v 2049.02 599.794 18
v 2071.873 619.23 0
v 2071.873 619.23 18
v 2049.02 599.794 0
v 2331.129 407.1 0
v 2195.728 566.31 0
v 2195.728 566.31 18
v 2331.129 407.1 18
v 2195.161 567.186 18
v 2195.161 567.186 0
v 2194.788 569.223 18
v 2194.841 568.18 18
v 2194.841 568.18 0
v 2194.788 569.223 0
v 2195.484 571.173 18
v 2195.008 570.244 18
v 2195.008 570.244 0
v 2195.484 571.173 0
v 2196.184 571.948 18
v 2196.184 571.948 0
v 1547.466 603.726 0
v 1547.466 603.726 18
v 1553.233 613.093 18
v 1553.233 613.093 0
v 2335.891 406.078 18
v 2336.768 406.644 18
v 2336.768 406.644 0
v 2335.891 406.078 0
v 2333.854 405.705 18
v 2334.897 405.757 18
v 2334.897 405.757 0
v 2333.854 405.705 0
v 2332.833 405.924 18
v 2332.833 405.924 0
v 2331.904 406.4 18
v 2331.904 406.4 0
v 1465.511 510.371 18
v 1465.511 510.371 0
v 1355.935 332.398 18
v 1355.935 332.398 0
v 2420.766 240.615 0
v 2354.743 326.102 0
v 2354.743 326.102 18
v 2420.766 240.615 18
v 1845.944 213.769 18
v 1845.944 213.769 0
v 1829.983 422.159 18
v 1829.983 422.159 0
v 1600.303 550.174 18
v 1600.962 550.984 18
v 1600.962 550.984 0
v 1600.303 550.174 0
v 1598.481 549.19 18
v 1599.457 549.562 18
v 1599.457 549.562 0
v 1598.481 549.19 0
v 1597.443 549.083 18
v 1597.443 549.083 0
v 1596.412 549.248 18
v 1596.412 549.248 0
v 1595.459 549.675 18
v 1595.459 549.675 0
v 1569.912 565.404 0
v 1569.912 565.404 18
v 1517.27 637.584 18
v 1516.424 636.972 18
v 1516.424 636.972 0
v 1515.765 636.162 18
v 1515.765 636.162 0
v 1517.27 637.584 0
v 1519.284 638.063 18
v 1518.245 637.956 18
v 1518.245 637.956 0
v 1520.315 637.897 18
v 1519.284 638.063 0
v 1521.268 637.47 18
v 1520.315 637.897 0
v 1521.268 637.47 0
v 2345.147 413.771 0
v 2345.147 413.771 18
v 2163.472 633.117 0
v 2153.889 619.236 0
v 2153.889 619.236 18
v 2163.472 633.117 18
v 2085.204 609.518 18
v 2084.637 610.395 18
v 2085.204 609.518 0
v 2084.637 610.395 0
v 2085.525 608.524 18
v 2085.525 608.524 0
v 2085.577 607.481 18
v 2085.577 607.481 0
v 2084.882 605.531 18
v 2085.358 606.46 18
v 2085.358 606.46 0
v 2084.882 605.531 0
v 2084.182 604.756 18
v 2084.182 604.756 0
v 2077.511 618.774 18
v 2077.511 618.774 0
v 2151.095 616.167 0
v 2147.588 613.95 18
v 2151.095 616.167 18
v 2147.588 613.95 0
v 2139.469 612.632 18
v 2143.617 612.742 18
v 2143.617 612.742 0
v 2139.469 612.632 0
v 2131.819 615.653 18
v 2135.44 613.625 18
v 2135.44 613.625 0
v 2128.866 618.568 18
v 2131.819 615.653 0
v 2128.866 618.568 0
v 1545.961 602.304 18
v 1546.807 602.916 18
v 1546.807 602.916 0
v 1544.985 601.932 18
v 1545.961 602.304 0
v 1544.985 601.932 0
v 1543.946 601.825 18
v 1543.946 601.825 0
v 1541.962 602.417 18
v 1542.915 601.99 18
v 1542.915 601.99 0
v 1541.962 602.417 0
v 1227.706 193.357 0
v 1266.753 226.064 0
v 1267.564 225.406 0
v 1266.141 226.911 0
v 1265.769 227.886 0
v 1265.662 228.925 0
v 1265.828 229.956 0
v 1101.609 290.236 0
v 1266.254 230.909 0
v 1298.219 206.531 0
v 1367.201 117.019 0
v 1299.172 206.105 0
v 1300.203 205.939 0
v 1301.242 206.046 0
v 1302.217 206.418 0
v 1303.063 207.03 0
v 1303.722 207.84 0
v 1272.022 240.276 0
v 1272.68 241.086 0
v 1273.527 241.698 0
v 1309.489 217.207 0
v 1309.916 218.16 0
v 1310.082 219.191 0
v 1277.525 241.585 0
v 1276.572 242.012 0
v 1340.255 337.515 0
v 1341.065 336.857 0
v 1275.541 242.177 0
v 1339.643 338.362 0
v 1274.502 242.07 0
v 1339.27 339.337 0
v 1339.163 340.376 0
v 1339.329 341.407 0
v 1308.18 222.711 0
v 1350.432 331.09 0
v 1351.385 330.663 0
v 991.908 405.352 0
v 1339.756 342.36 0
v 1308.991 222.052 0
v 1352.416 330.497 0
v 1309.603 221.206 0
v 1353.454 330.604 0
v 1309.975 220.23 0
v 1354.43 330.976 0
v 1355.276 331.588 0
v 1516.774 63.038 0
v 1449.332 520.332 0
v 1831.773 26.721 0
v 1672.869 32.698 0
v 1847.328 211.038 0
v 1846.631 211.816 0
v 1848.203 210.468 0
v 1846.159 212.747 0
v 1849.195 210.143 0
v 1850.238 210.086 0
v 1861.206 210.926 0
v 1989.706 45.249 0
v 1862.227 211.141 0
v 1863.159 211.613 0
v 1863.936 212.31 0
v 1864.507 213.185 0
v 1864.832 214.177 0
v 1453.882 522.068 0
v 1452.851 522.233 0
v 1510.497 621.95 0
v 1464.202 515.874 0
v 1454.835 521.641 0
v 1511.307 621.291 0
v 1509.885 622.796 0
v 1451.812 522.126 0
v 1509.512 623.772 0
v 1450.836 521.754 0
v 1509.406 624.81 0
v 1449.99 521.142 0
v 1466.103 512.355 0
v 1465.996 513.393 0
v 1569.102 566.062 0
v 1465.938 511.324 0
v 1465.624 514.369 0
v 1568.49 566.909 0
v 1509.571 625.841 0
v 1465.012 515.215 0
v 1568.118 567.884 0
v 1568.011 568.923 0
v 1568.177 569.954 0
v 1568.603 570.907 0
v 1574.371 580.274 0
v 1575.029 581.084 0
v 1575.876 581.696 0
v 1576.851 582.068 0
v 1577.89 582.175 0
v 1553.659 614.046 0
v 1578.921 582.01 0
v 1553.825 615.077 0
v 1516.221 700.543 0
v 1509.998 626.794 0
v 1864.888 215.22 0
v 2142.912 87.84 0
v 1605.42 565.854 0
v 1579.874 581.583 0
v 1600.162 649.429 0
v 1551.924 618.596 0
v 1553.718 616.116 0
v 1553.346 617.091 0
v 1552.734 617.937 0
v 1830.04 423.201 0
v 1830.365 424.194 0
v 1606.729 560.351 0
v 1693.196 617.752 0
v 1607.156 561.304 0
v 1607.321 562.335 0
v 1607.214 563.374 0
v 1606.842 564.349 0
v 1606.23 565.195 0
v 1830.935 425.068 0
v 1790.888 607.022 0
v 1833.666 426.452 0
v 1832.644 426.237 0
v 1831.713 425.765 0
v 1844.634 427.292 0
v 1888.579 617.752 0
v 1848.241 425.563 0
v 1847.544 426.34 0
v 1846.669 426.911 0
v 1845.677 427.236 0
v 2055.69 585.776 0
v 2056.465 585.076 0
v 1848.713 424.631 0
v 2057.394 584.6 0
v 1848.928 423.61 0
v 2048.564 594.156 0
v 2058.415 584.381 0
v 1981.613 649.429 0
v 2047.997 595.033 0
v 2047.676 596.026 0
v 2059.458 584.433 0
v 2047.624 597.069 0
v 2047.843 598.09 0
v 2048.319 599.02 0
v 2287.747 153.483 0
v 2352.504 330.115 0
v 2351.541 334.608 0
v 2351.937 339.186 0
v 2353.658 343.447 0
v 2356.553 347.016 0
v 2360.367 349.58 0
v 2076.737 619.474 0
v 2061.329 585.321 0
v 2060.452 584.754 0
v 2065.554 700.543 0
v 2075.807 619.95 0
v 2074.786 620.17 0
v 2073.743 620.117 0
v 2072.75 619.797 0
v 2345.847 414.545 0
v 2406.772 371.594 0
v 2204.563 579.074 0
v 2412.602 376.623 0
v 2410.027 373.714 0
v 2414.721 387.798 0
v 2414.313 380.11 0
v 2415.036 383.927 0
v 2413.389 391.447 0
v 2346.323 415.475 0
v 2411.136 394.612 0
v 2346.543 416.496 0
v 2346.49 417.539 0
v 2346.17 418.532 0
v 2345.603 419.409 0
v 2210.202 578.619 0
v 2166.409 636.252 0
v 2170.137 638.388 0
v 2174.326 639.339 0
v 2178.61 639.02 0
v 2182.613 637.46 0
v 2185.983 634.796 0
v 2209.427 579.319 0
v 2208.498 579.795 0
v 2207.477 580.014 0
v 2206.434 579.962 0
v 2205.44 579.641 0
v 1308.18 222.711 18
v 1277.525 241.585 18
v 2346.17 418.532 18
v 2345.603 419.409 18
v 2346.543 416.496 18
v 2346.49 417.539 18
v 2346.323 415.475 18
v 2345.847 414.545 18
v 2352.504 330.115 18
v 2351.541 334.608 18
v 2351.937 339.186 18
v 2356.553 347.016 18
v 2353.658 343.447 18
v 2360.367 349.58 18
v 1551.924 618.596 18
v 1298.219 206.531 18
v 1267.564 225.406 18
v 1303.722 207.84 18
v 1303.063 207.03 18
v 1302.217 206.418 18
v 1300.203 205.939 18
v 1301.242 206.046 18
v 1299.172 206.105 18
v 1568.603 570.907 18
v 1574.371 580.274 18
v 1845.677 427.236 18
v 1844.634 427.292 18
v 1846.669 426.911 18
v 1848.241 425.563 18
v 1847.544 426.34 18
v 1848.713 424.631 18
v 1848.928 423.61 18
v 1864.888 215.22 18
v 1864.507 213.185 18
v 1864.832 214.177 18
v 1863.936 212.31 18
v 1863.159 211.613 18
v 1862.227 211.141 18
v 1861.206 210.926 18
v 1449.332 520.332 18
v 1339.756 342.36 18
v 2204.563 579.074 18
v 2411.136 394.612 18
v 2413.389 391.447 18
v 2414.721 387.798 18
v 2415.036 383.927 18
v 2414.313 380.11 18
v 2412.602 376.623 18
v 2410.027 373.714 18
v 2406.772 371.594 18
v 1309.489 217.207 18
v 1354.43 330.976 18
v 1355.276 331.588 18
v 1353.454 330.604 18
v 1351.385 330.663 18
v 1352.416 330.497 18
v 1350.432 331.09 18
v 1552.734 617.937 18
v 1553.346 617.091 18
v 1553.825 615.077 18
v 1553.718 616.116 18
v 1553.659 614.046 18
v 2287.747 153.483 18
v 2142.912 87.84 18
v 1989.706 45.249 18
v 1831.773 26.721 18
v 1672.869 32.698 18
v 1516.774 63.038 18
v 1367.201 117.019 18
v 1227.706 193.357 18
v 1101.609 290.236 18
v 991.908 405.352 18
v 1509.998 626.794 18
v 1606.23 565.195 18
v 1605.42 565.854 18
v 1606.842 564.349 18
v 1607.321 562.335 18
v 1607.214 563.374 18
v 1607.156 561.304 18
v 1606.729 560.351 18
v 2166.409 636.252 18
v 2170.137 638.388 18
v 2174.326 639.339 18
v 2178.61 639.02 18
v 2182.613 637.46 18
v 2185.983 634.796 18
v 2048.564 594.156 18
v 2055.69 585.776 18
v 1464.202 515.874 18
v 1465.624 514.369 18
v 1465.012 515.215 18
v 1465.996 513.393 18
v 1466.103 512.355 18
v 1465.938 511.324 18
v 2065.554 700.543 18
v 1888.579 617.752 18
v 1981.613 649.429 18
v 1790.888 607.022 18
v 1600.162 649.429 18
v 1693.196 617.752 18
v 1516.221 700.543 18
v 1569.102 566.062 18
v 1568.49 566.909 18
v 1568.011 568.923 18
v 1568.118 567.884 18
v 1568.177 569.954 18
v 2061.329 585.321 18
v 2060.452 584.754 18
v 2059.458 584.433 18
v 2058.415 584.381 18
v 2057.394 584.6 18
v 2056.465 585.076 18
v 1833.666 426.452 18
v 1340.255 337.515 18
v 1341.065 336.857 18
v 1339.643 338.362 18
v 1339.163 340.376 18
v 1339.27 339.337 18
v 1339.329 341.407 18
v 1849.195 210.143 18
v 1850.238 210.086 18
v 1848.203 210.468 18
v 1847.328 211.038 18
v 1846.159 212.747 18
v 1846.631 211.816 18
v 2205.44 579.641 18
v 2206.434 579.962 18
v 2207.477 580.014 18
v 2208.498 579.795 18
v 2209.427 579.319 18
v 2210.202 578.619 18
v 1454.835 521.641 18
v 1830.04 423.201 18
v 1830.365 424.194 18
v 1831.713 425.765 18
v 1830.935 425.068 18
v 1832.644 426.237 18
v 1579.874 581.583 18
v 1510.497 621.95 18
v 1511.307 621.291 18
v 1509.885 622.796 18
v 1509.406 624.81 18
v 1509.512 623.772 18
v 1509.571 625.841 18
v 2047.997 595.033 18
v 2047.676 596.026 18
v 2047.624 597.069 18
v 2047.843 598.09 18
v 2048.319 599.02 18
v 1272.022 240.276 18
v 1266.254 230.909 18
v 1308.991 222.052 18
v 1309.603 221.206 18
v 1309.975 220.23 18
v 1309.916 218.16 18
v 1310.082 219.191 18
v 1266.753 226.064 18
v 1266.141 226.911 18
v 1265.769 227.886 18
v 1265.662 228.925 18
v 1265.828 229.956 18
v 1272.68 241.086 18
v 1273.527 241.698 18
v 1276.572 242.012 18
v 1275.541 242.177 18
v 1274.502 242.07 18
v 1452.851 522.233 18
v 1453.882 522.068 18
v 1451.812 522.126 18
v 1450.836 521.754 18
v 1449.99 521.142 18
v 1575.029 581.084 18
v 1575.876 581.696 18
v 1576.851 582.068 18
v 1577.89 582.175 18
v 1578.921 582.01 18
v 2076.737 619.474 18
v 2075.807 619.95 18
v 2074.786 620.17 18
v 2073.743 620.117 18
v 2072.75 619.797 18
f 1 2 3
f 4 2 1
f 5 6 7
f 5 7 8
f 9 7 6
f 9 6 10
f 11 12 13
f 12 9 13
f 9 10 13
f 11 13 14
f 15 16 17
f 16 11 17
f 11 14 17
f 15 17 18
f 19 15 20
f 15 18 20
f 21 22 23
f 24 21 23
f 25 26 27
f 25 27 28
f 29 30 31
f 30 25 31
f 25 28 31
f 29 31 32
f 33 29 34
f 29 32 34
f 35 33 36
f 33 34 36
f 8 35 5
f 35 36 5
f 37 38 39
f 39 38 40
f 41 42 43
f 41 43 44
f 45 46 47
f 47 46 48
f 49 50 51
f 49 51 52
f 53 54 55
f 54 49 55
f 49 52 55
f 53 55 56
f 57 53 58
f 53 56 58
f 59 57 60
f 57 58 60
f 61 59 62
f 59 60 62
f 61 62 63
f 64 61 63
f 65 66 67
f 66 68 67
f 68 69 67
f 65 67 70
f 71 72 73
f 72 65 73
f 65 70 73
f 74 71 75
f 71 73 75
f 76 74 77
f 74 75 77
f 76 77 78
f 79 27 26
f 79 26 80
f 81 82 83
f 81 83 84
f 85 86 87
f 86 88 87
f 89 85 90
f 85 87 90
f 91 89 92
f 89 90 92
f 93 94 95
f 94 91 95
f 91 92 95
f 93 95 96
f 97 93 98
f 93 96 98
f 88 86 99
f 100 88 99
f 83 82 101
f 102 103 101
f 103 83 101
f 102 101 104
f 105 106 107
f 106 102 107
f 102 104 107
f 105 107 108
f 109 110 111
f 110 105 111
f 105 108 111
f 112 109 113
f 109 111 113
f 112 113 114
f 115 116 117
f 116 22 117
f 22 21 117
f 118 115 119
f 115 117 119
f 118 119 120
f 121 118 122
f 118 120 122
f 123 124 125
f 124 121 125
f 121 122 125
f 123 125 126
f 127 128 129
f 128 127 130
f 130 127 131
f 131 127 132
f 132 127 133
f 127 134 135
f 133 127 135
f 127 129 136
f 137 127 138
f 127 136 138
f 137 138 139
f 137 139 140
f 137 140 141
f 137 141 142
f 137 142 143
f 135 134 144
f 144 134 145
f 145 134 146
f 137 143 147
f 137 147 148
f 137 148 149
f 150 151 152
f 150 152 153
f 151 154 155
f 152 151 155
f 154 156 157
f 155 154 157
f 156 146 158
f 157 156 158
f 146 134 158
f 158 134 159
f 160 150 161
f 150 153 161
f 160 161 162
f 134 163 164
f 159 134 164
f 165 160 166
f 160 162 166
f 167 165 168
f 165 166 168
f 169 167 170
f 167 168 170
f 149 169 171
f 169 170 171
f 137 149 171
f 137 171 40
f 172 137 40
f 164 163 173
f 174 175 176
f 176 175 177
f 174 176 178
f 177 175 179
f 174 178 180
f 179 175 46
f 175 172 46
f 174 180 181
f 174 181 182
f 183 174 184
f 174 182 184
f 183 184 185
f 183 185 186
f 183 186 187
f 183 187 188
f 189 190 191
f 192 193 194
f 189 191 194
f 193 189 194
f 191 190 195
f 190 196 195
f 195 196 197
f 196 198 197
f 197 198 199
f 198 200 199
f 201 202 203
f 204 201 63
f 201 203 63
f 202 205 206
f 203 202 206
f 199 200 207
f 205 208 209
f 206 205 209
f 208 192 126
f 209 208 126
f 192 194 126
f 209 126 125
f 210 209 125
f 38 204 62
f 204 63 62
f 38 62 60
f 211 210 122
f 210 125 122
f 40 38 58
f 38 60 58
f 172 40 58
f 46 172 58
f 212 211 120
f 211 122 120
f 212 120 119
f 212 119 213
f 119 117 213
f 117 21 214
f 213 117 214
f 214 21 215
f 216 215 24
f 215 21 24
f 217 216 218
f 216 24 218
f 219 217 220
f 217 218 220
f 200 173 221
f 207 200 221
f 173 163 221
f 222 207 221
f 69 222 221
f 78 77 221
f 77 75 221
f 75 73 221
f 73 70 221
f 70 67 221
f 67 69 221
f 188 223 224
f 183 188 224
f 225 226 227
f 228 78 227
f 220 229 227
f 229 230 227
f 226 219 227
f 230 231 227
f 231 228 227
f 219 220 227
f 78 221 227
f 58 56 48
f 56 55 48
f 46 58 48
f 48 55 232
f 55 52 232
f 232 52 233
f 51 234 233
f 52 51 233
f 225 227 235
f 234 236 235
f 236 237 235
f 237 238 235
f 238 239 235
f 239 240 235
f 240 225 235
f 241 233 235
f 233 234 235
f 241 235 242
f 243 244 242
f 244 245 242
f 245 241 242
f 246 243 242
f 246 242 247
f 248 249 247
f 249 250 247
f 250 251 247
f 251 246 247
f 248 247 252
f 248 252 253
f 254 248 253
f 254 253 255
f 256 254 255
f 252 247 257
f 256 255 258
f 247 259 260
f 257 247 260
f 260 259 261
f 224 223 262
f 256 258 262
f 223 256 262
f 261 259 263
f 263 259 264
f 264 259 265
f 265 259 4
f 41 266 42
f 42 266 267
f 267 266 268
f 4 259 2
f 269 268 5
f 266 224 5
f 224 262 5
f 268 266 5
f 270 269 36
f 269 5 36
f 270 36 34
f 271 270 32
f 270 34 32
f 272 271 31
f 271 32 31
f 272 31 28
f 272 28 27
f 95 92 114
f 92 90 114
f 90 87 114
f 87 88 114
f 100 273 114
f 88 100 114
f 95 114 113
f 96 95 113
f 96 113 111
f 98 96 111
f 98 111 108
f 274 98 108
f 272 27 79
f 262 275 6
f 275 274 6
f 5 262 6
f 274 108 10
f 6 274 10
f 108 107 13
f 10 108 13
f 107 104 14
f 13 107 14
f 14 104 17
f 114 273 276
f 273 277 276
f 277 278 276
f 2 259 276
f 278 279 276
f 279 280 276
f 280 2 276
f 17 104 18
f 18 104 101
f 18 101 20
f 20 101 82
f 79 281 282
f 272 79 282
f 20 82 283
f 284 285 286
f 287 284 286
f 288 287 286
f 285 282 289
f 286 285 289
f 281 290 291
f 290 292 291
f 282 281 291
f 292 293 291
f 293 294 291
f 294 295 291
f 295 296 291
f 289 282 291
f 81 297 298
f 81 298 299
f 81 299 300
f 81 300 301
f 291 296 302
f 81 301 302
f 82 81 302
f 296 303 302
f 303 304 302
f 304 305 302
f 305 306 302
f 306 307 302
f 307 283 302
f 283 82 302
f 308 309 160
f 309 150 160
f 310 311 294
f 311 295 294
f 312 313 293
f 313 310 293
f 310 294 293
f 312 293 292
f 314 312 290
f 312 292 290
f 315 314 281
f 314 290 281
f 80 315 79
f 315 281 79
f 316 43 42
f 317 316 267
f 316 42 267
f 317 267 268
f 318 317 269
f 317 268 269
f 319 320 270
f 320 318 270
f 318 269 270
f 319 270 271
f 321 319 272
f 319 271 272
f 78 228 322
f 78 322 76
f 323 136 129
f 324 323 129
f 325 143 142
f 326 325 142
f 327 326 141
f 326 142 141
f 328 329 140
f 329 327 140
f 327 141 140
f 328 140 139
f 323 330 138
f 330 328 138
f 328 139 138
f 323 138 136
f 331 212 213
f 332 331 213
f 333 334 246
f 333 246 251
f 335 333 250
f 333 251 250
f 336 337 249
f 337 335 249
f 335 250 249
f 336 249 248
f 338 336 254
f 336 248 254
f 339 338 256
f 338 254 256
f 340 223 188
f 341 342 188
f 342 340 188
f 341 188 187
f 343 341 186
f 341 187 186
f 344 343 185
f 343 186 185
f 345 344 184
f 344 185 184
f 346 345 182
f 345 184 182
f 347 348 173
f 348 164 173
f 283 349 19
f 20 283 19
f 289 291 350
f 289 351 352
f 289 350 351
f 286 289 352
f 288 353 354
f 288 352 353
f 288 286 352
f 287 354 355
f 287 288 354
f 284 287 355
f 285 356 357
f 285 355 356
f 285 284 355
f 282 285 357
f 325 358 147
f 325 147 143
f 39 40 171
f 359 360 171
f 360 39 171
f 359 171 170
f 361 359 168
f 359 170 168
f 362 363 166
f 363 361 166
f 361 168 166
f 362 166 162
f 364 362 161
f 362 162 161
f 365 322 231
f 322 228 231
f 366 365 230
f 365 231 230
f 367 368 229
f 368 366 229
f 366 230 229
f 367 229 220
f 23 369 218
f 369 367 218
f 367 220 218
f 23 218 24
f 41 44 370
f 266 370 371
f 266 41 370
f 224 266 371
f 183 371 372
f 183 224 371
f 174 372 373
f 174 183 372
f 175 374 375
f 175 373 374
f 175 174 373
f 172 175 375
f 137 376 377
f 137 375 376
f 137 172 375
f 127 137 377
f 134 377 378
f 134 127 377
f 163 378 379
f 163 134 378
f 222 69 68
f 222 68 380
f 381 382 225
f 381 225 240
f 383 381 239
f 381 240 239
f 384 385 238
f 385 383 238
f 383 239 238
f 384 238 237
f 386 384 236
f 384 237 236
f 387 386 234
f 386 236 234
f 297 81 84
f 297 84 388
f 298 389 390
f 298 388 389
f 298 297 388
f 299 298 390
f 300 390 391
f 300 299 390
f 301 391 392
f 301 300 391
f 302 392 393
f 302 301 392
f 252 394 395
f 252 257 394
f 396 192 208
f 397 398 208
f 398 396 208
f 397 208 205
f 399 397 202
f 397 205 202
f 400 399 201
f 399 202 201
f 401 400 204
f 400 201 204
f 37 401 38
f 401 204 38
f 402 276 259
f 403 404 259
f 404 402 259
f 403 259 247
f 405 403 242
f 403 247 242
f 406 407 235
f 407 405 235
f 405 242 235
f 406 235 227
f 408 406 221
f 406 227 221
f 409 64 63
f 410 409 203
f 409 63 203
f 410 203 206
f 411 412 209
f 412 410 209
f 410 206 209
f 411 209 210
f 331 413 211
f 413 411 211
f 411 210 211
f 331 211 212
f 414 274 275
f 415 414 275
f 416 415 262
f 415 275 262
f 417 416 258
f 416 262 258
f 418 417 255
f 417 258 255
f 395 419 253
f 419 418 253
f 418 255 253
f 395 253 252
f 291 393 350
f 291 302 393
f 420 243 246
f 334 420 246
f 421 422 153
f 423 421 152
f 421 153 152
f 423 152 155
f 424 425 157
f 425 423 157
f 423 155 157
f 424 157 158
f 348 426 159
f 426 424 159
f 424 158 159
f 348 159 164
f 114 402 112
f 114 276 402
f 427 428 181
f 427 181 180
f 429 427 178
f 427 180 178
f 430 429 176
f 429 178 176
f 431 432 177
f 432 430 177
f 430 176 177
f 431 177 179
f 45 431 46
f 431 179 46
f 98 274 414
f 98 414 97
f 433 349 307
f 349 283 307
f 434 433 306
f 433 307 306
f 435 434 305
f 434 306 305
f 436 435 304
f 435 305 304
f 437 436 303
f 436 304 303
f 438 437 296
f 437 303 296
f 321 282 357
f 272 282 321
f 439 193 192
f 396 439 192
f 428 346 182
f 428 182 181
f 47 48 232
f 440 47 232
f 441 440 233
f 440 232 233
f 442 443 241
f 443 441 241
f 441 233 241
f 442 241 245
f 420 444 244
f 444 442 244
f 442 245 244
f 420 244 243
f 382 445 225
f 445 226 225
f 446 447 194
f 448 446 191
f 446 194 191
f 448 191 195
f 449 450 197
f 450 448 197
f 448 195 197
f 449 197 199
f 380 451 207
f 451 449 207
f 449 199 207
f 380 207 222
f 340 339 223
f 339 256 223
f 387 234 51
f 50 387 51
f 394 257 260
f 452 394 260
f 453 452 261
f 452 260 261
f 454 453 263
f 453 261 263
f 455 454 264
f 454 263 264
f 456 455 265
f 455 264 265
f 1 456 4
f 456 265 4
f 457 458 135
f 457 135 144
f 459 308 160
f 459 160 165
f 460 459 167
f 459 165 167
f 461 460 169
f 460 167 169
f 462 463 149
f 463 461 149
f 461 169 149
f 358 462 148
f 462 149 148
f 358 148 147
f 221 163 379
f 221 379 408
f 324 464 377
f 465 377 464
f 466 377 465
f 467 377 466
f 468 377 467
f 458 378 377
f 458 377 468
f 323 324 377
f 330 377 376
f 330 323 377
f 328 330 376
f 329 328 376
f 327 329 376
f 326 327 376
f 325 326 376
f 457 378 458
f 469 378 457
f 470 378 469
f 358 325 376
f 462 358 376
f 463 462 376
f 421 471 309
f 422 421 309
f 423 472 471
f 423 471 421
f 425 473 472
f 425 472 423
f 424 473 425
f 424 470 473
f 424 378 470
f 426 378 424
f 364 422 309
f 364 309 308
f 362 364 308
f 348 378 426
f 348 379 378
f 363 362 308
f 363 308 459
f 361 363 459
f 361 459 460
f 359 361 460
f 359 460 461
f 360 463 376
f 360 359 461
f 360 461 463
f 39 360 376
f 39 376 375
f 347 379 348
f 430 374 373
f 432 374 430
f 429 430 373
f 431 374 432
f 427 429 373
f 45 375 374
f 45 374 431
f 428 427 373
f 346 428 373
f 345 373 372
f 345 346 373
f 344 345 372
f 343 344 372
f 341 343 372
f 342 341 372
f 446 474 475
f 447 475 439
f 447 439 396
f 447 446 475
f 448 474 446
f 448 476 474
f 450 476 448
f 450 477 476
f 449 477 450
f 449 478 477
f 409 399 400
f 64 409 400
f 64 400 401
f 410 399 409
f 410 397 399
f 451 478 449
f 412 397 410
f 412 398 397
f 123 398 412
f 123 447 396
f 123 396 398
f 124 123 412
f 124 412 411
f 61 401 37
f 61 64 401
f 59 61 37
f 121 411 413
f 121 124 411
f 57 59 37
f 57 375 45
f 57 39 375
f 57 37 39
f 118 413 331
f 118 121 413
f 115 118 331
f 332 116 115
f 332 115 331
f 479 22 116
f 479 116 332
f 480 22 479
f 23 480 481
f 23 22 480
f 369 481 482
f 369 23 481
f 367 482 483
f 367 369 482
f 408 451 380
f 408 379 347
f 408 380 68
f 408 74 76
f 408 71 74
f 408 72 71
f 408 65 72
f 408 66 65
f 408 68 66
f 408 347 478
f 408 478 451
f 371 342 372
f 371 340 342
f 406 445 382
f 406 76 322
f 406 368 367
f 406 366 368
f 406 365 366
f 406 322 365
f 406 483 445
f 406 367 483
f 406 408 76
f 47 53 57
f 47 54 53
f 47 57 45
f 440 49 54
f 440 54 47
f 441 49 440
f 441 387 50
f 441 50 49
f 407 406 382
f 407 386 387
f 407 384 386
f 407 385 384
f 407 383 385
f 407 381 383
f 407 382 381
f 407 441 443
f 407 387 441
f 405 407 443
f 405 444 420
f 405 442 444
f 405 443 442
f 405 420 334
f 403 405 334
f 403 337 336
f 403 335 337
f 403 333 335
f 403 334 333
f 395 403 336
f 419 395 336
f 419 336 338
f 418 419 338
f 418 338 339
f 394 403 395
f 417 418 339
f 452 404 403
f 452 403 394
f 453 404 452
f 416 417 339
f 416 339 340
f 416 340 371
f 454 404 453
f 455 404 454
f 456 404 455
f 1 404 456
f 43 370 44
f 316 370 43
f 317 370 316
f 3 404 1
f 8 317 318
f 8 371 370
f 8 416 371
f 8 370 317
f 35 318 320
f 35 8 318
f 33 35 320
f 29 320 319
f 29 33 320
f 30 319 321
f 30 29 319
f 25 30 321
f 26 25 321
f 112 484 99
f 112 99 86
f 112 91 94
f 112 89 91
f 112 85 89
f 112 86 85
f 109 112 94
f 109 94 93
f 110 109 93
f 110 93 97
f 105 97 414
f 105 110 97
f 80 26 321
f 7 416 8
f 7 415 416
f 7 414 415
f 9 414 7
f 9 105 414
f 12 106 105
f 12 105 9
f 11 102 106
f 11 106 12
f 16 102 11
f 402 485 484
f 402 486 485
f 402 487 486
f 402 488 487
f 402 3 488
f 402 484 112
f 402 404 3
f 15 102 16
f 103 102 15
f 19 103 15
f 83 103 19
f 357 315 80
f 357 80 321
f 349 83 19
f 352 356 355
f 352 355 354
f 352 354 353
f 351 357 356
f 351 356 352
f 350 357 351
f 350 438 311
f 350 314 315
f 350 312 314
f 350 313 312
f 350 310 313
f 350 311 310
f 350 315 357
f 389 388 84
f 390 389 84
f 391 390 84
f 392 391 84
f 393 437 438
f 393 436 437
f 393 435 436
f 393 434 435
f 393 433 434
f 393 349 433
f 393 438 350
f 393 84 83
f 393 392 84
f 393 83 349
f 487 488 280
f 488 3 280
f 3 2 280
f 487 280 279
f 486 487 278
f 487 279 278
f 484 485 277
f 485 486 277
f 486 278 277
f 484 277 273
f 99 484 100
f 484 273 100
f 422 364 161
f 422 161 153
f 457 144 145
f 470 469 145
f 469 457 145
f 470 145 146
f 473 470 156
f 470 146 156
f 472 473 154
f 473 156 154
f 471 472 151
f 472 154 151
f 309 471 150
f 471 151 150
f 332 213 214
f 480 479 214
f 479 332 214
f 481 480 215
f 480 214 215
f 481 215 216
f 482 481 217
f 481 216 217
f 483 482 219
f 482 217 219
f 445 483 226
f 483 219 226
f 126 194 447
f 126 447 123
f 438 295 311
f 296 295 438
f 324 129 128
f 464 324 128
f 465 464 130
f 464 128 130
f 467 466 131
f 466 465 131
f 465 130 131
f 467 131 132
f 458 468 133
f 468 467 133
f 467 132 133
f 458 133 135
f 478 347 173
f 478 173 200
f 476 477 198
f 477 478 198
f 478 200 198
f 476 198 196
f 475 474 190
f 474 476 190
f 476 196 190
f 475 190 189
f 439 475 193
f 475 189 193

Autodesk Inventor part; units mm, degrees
ref_plane "YZ Plane" through (0, 0, 0) normal (1, 0, 0) x (0, 1, 0)
ref_plane "XZ Plane" through (0, 0, 0) normal (0, 1, 0) x (-1, 0, 0)
ref_plane "XY Plane" through (0, 0, 0) normal (0, 0, 1) x (1, 0, 0)
sketch "CONTOURS" plane through (0, 0, 0) normal (0, 0, 1) x (1, 0, 0)
  line L0 (2153.8888, 619.2359) -> (2163.4719, 633.117)
  arc A0 (2185.9832, 634.7957) -> (2163.4719, 633.117) centre (2175.4045, 624.8791) ccw
  line L1 (2185.9832, 634.7957) -> (2411.1355, 394.6117)
  arc A1 (2406.7717, 371.5944) -> (2411.1355, 394.6117) centre (2400.5567, 384.695) ccw
  line L2 (2406.7717, 371.5944) -> (2360.367, 349.5799)
  arc A2 (2360.367, 349.5799) -> (2354.7432, 326.1016) centre (2367.0105, 335.5759) ccw
  line L3 (2354.7432, 326.1016) -> (2420.766, 240.6152)
  arc A3 (991.9076, 405.3519) -> (2420.766, 240.6152) centre (1790.9625, 1056.9921) ccw
  line L4 (991.9076, 405.3519) -> (1516.221, 700.5434)
  arc A4 (1516.221, 700.5434) -> (2065.5544, 700.5434) centre (1790.8877, 1057.1243) ccw
  line L5 (2065.5544, 700.5434) -> (2128.8659, 618.5677)
  arc A5 (2128.8659, 618.5677) -> (2153.8888, 619.2359) centre (2141.1332, 628.042) ccw
sketch "HOLES" plane through (0, 0, 0) normal (0, 0, 1) x (1, 0, 0)
  arc A0 (1449.9335, 932.975) -> (1455.5442, 933.6958) centre (1452.3785, 936.1408) ccw
  line L0 (1449.9335, 932.975) -> (1421.4416, 954.9799)
  arc A1 (1420.7208, 960.5906) -> (1421.4416, 954.9799) centre (1423.8866, 958.1456) ccw
  line L1 (1420.7208, 960.5906) -> (1427.4445, 969.2965)
  arc A2 (1433.0553, 970.0172) -> (1427.4445, 969.2965) centre (1430.6103, 966.8515) ccw
  line L2 (1433.0553, 970.0172) -> (1461.5471, 948.0124)
  arc A3 (1462.2679, 942.4017) -> (1461.5471, 948.0124) centre (1459.1022, 944.8467) ccw
  line L3 (581.1233, 599.0223) -> (574.9213, 608.1072)
  arc A4 (574.9213, 608.1072) -> (569.3624, 609.1555) centre (571.6177, 605.8519) ccw
  line L4 (569.3624, 609.1555) -> (539.6301, 588.858)
  arc A5 (539.6301, 588.858) -> (538.5818, 583.2991) centre (541.8854, 585.5544) ccw
  line L5 (538.5818, 583.2991) -> (544.7838, 574.2142)
  arc A6 (544.7838, 574.2142) -> (550.3427, 573.1659) centre (548.0874, 576.4695) ccw
  line L6 (550.3427, 573.1659) -> (580.075, 593.4634)
  arc A7 (580.075, 593.4634) -> (581.1233, 599.0223) centre (577.8197, 596.767) ccw
  line L7 (1171.3736, 565.7512) -> (1178.0973, 574.4571)
  arc A8 (1178.0973, 574.4571) -> (1177.3765, 580.0678) centre (1174.9316, 576.9021) ccw
  line L8 (1177.3765, 580.0678) -> (1148.8847, 602.0727)
  arc A9 (1148.8847, 602.0727) -> (1143.2739, 601.3519) centre (1146.4397, 598.9069) ccw
  line L9 (1143.2739, 601.3519) -> (1136.5502, 592.646)
  arc A10 (1136.5502, 592.646) -> (1137.271, 587.0353) centre (1139.716, 590.201) ccw
  line L10 (1137.271, 587.0353) -> (1165.7629, 565.0304)
  arc A11 (1165.7629, 565.0304) -> (1171.3736, 565.7512) centre (1168.2079, 568.1962) ccw
  line L11 (312.7987, 992.0706) -> (319.0007, 982.9857)
  arc A12 (317.9524, 977.4269) -> (319.0007, 982.9857) centre (315.6972, 980.7305) ccw
  line L12 (317.9524, 977.4269) -> (288.2201, 957.1293)
  arc A13 (282.6613, 958.1776) -> (288.2201, 957.1293) centre (285.9648, 960.4329) ccw
  line L13 (282.6613, 958.1776) -> (276.4592, 967.2625)
  arc A14 (277.5075, 972.8214) -> (276.4592, 967.2625) centre (279.7628, 969.5178) ccw
  line L14 (277.5075, 972.8214) -> (307.2399, 993.1189)
  arc A15 (312.7987, 992.0706) -> (307.2399, 993.1189) centre (309.4951, 989.8153) ccw
  arc A16 (877.4586, 807.9096) -> (881.5741, 811.7907) centre (877.5758, 811.9079) ccw
  line L15 (881.5741, 811.7907) -> (887.6999, 1020.7009)
  arc A17 (887.6999, 1020.7009) -> (883.8189, 1024.8164) centre (883.7016, 1020.8181) ccw
  line L16 (883.8189, 1024.8164) -> (872.8236, 1025.1388)
  arc A18 (872.8236, 1025.1388) -> (868.7081, 1021.2578) centre (872.7064, 1021.1405) ccw
  line L17 (868.7081, 1021.2578) -> (862.5822, 812.3476)
  arc A19 (862.5822, 812.3476) -> (866.4633, 808.232) centre (866.5805, 812.2303) ccw
  line L18 (866.4633, 808.232) -> (877.4586, 807.9096)
  arc A20 (370.076, 874.2818) -> (369.0277, 868.7229) centre (372.3312, 870.9782) ccw
  line L19 (369.0277, 868.7229) -> (486.8661, 696.1104)
  arc A21 (486.8661, 696.1104) -> (492.425, 695.062) centre (490.1697, 698.3656) ccw
  line L20 (492.425, 695.062) -> (501.5098, 701.2641)
  arc A22 (501.5098, 701.2641) -> (502.5581, 706.8229) centre (499.2546, 704.5677) ccw
  line L21 (502.5581, 706.8229) -> (384.7197, 879.4355)
  arc A23 (384.7197, 879.4355) -> (379.1608, 880.4838) centre (381.4161, 877.1802) ccw
  line L22 (379.1608, 880.4838) -> (370.076, 874.2818)
  line L23 (1833.6661, 426.4523) -> (1844.634, 427.2924)
  arc A24 (1833.6661, 426.4523) -> (1829.9832, 422.1586) centre (1833.9716, 422.464) ccw
  line L24 (1845.9439, 213.7689) -> (1829.9832, 422.1586)
  arc A25 (1101.2975, 659.9143) -> (1095.6868, 659.1936) centre (1098.8525, 656.7486) ccw
  arc A26 (1845.9439, 213.7689) -> (1850.2377, 210.086) centre (1849.9322, 214.0744) ccw
  arc A27 (2077.5111, 618.774) -> (2071.8727, 619.2297) centre (2074.4641, 616.1826) ccw
  line L25 (620.0838, 641.0058) -> (644.8608, 657.9204)
  arc A28 (644.8608, 657.9204) -> (645.9091, 663.4793) centre (642.6055, 661.224) ccw
  line L26 (645.9091, 663.4793) -> (639.707, 672.5642)
  arc A29 (639.707, 672.5642) -> (634.1482, 673.6125) centre (636.4035, 670.3089) ccw
  line L27 (634.1482, 673.6125) -> (609.3712, 656.6979)
  arc A30 (609.3712, 656.6979) -> (608.3229, 651.139) centre (611.6265, 653.3943) ccw
  line L28 (608.3229, 651.139) -> (614.525, 642.0541)
  arc A31 (614.525, 642.0541) -> (620.0838, 641.0058) centre (617.8286, 644.3094) ccw
  line L29 (1089.6839, 644.877) -> (1113.4271, 626.5396)
  arc A32 (1113.4271, 626.5396) -> (1119.0379, 627.2604) centre (1115.8721, 629.7054) ccw
  line L30 (1119.0379, 627.2604) -> (1125.7616, 635.9662)
  arc A33 (1125.7616, 635.9662) -> (1125.0408, 641.577) centre (1122.5958, 638.4112) ccw
  line L31 (1125.0408, 641.577) -> (1101.2975, 659.9143)
  arc A34 (1553.2327, 613.0929) -> (1551.9237, 618.5962) centre (1549.8265, 615.19) ccw
  line L32 (1095.6868, 659.1936) -> (1088.9631, 650.4877)
  arc A35 (1088.9631, 650.4877) -> (1089.6839, 644.877) centre (1092.1288, 648.0427) ccw
  line L33 (1266.2545, 230.909) -> (1272.0216, 240.2759)
  arc A36 (1277.5249, 241.5849) -> (1272.0216, 240.2759) centre (1275.4278, 238.1788) ccw
  line L34 (1277.5249, 241.5849) -> (1308.1804, 222.7106)
  arc A37 (1309.4894, 217.2073) -> (1308.1804, 222.7106) centre (1306.0833, 219.3045) ccw
  line L35 (1309.4894, 217.2073) -> (1303.7223, 207.8403)
  arc A38 (1298.219, 206.5313) -> (1303.7223, 207.8403) centre (1300.3161, 209.9375) ccw
  line L36 (1298.219, 206.5313) -> (1267.5635, 225.4056)
  arc A39 (1266.2545, 230.909) -> (1267.5635, 225.4056) centre (1269.6606, 228.8118) ccw
  line L37 (1515.7649, 636.1615) -> (1509.9977, 626.7945)
  arc A40 (1509.9977, 626.7945) -> (1511.3067, 621.2912) centre (1513.4039, 624.6974) ccw
  line L38 (1511.3067, 621.2912) -> (1541.9622, 602.4169)
  arc A41 (1541.9622, 602.4169) -> (1547.4655, 603.7259) centre (1544.0594, 605.8231) ccw
  line L39 (1547.4655, 603.7259) -> (1553.2327, 613.0929)
  line L40 (1551.9237, 618.5962) -> (1521.2682, 637.4705)
  arc A42 (1521.2682, 637.4705) -> (1515.7649, 636.1615) centre (1519.171, 634.0643) ccw
  line L41 (2048.564, 594.1557) -> (2055.6903, 585.7762)
  arc A43 (2055.6903, 585.7762) -> (2061.3288, 585.3206) centre (2058.7374, 588.3676) ccw
  line L42 (2061.3288, 585.3206) -> (2084.1818, 604.7561)
  arc A44 (2084.1818, 604.7561) -> (2084.6375, 610.3946) centre (2081.5904, 607.8032) ccw
  line L43 (2084.6375, 610.3946) -> (2077.5111, 618.774)
  line L44 (2071.8727, 619.2297) -> (2049.0196, 599.7942)
  arc A45 (2049.0196, 599.7942) -> (2048.564, 594.1557) centre (2051.611, 596.7471) ccw
  arc A46 (2196.184, 571.948) -> (2195.7283, 566.3095) centre (2198.7754, 568.9009) ccw
  line L45 (2195.7283, 566.3095) -> (2331.1291, 407.1002)
  arc A47 (2331.1291, 407.1002) -> (2336.7676, 406.6445) centre (2334.1762, 409.6916) ccw
  line L46 (2336.7676, 406.6445) -> (2345.147, 413.7708)
  arc A48 (2345.147, 413.7708) -> (2345.6027, 419.4093) centre (2342.5556, 416.8179) ccw
  line L47 (2345.6027, 419.4093) -> (2210.2019, 578.6187)
  arc A49 (2210.2019, 578.6187) -> (2204.5634, 579.0743) centre (2207.1548, 576.0273) ccw
  line L48 (2204.5634, 579.0743) -> (2196.184, 571.948)
  arc A50 (1339.7556, 342.3599) -> (1341.0646, 336.8566) centre (1343.1618, 340.2628) ccw
  line L49 (1339.7556, 342.3599) -> (1449.3315, 520.3322)
  arc A51 (1454.8349, 521.6412) -> (1449.3315, 520.3322) centre (1452.7377, 518.235) ccw
  line L50 (1454.8349, 521.6412) -> (1464.2018, 515.874)
  arc A52 (1465.5108, 510.3707) -> (1464.2018, 515.874) centre (1462.1047, 512.4678) ccw
  line L51 (1465.5108, 510.3707) -> (1355.9349, 332.3985)
  arc A53 (1350.4316, 331.0895) -> (1355.9349, 332.3985) centre (1352.5287, 334.4956) ccw
  line L52 (1350.4316, 331.0895) -> (1341.0646, 336.8566)
  line L53 (1462.2679, 942.4017) -> (1455.5442, 933.6958)
  arc A54 (1606.7292, 560.351) -> (1605.4201, 565.8543) centre (1603.323, 562.4481) ccw
  line L54 (1579.8739, 581.5829) -> (1605.4201, 565.8543)
  arc A55 (1579.8739, 581.5829) -> (1574.3706, 580.2739) centre (1577.7767, 578.1767) ccw
  line L55 (1568.6034, 570.9069) -> (1574.3706, 580.2739)
  arc A56 (1568.6034, 570.9069) -> (1569.9124, 565.4036) centre (1572.0096, 568.8098) ccw
  line L56 (1595.4587, 549.675) -> (1569.9124, 565.4036)
  arc A57 (1595.4587, 549.675) -> (1600.962, 550.984) centre (1597.5558, 553.0812) ccw
  line L57 (1606.7292, 560.351) -> (1600.962, 550.984)
  line L58 (1861.2056, 210.9261) -> (1850.2377, 210.086)
  arc A58 (1861.2056, 210.9261) -> (1864.8884, 215.2199) centre (1860.9001, 214.9144) ccw
  line L59 (1848.9278, 423.6095) -> (1864.8884, 215.2199)
  arc A59 (1848.9278, 423.6095) -> (1844.634, 427.2924) centre (1844.9394, 423.3041) ccw
  dimension "d13" = 122.5342
  dimension "d15" = 116.3458
  dimension "d17" = 116.3234
  dimension "d19" = 19
  dimension "d21" = 122.5114
  dimension "d23" = 30
  dimension "d25" = 36
  dimension "d27" = 36
  dimension "d29" = 29
sketch "LETTERS" plane through (0, 0, 0) normal (0, 0, 1) x (1, 0, 0)
  line L0 (1512.6274, 378.3219) -> (1504.8915, 360.2317)
  line L1 (1504.8915, 360.2317) -> (1513.0744, 356.7244)
  arc A0 (1517.2734, 366.5323) -> (1520.8186, 374.8004) centre (1519.042, 370.668) ccw
  line L2 (1517.2734, 366.5323) -> (1509.1534, 370.0046)
  arc A1 (1513.0744, 356.7244) -> (1517.2734, 366.5323) centre (1515.1759, 361.6275) ccw
  line L3 (1520.8186, 374.8004) -> (1512.6274, 378.3219)
extrude "Extrusion2" add sketch "CONTOURS" along normal blind 18
extrude "Extrusion3" cut sketch "HOLES" along normal blind 18 contours L23 A59 L59 A58 L58 A26 L24 A24 | L43 A44 L42 A43 L41 A45 L44 A27 | L39 A41 L38 A40 L37 A42 L40 A34 | L33 A36 L34 A37 L35 A38 L36 A39 | L48 A49 L47 A48 L46 A47 L45 A46 | L49 A51 L50 A52 L51 A53 L52 A50 | L57 A57 L56 A56 L55 A55 L54 A54
properties part number "Platform B1" material "Wood (Birch)"
